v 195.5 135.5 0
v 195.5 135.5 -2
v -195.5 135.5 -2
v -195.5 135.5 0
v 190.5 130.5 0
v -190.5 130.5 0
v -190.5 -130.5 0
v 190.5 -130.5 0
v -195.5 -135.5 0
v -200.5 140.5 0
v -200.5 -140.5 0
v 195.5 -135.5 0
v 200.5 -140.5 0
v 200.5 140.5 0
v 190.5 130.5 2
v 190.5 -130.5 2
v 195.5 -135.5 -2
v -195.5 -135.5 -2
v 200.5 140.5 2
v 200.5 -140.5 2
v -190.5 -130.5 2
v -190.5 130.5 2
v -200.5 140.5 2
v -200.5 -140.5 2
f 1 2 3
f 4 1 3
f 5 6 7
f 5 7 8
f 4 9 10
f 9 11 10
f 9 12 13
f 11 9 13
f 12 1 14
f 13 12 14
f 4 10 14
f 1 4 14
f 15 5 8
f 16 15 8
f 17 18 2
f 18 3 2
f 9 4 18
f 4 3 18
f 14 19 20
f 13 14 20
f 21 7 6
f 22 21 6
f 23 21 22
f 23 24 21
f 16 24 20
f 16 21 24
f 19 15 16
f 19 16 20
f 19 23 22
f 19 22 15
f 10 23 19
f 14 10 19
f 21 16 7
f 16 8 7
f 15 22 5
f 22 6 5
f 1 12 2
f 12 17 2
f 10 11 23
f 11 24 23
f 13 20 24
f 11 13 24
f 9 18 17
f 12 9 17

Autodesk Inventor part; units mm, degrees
ref_plane "YZ Plane" through (0, 0, 0) normal (1, 0, 0) x (0, 1, 0)
ref_plane "XZ Plane" through (0, 0, 0) normal (0, 1, 0) x (-1, 0, 0)
ref_plane "XY Plane" through (0, 0, 0) normal (0, 0, 1) x (1, 0, 0)
sketch "Skizze1" plane through (0, 0, 0) normal (0, 0, 1) x (1, 0, 0)
  line L0 (-273.7, 0) -> (273.7, 0) projected
  line L1 (0, -189.7) -> (0, 189.7) projected
  line L2 (-195.5, 135.5) -> (195.5, 135.5)
  line L3 (195.5, 135.5) -> (195.5, -135.5)
  line L4 (195.5, -135.5) -> (-195.5, -135.5)
  line L5 (-195.5, -135.5) -> (-195.5, 135.5)
  point P0 (0, 0)
  dimension "d0" = 391
  dimension "d1" = 271
extrude "Extrusion1" add sketch "Skizze1" against normal blind 2
sketch "Skizze2" plane through (0, 0, 0) normal (0, 0, 1) x (1, 0, 0)
  line L0 (-190.5, 130.5) -> (190.5, 130.5)
  line L1 (190.5, 130.5) -> (190.5, -130.5)
  line L2 (190.5, -130.5) -> (-190.5, -130.5)
  line L3 (-190.5, -130.5) -> (-190.5, 130.5)
  line L4 (195.5, -135.5) -> (195.5, 135.5) projected
  line L5 (195.5, 135.5) -> (-195.5, 135.5) projected
  line L6 (-195.5, 135.5) -> (-195.5, -135.5) projected
  line L7 (-195.5, -135.5) -> (195.5, -135.5) projected
  point P0 (0, 0)
  dimension "d12" = 5
  dimension "d13" = 5
  dimension "d14" = 5
  dimension "d15" = 5
extrude "Extrusion2" add sketch "Skizze2" along normal blind 2
sketch "Skizze3" plane through (0, 0, 2) normal (0, 0, 1) x (1, 0, 0)
  line L0 (-200.5, 140.5) -> (200.5, 140.5)
  line L1 (200.5, 140.5) -> (200.5, -140.5)
  line L2 (200.5, -140.5) -> (-200.5, -140.5)
  line L3 (-200.5, -140.5) -> (-200.5, 140.5)
  line L4 (195.5, 135.5) -> (-195.5, 135.5) projected
  line L5 (-195.5, -135.5) -> (195.5, -135.5) projected
  line L6 (195.5, -135.5) -> (195.5, 135.5) projected
  line L7 (-195.5, 135.5) -> (-195.5, -135.5) projected
  point P0 (0, 0)
  dimension "d18" = 5
  dimension "d19" = 5
  dimension "d20" = 5
  dimension "d21" = 5
extrude "Extrusion3" add sketch "Skizze3" against normal blind 2
properties part number "Deckel"
